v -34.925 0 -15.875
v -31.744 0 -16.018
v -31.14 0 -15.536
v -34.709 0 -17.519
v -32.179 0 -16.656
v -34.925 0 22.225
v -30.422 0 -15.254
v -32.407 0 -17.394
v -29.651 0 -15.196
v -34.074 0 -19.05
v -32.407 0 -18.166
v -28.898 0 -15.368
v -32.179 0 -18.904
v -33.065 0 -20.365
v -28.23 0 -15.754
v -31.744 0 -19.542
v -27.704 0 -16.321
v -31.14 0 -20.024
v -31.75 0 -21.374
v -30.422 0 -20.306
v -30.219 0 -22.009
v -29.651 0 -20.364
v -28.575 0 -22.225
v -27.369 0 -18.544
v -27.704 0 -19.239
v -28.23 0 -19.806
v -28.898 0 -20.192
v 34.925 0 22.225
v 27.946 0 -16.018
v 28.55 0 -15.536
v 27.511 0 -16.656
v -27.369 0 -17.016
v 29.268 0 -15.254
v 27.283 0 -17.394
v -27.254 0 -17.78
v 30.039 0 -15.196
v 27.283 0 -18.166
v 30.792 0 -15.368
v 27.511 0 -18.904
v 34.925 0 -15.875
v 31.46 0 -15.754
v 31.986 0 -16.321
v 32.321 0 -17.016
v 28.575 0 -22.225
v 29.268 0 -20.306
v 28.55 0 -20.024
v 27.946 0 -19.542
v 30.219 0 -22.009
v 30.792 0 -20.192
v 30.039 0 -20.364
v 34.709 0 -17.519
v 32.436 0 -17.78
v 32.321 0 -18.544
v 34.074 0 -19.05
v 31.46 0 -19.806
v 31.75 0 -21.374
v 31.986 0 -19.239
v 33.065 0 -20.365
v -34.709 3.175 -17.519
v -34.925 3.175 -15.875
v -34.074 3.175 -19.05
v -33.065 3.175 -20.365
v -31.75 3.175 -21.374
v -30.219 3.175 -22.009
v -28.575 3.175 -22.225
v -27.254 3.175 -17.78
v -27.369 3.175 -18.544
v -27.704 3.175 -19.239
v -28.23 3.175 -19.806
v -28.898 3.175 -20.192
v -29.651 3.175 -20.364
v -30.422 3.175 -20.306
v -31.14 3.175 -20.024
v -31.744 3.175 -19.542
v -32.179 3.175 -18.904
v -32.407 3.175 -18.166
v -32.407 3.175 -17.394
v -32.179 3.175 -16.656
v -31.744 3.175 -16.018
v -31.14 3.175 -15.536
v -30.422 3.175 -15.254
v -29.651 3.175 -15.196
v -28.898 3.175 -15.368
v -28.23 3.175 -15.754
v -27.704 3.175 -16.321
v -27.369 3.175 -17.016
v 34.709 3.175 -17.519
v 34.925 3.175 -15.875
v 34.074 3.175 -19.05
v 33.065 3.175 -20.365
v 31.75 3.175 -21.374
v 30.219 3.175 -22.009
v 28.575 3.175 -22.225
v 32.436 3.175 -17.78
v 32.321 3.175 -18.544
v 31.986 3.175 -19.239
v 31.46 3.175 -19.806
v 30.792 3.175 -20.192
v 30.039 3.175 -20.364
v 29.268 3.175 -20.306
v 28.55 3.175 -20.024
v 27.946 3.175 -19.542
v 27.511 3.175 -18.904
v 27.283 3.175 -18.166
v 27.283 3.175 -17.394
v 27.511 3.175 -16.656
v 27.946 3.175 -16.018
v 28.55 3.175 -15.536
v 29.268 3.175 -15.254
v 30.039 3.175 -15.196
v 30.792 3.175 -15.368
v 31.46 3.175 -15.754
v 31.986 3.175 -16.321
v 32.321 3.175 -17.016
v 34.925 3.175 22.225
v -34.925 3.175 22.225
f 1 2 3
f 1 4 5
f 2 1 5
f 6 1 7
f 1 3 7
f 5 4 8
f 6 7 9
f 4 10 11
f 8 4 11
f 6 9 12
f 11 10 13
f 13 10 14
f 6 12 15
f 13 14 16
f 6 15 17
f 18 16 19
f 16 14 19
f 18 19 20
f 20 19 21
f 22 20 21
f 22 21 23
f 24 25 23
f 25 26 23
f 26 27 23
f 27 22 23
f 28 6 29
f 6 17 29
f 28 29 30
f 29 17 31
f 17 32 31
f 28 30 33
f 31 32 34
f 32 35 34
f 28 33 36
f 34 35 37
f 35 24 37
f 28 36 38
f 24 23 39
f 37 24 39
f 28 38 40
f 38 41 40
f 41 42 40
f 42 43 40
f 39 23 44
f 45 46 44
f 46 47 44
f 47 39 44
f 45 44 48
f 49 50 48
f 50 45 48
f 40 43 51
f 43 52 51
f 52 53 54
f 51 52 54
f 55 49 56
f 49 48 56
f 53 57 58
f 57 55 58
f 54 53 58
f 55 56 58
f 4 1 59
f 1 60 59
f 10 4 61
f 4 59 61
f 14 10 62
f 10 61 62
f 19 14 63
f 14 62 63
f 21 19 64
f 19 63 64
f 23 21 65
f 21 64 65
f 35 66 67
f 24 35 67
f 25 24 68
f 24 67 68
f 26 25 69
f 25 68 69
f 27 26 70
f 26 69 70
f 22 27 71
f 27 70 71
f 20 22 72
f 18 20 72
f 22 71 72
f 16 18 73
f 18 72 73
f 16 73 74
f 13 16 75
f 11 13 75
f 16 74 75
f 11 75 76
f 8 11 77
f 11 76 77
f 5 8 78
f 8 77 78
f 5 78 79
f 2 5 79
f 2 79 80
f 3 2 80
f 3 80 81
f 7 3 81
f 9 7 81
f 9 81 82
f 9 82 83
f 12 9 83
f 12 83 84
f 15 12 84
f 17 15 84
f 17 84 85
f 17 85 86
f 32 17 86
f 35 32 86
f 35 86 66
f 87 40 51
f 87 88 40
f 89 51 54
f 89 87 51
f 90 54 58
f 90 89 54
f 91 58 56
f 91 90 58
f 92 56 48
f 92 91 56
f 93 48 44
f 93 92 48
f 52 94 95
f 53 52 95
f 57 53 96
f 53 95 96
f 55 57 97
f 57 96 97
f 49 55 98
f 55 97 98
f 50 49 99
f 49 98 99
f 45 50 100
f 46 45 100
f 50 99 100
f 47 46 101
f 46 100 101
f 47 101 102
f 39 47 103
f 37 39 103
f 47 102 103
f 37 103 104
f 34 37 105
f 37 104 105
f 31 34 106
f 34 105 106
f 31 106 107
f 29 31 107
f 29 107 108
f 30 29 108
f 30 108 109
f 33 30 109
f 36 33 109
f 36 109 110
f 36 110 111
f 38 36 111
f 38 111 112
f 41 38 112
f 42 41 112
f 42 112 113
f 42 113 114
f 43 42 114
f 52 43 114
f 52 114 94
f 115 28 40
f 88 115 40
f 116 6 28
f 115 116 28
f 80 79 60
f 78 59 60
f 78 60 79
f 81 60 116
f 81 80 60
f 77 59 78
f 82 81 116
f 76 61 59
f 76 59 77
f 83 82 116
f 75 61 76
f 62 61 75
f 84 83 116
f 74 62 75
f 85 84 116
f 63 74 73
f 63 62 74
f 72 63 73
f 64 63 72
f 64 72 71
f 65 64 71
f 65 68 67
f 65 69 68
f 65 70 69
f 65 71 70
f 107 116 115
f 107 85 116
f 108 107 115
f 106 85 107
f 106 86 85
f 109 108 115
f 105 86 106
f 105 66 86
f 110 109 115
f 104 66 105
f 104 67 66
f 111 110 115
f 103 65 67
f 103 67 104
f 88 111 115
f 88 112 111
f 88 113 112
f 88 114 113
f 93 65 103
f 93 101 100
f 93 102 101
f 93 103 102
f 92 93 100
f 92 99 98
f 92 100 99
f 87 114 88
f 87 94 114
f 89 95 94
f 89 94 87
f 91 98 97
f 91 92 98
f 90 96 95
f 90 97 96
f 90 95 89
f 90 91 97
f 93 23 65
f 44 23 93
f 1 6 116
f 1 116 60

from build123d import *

# Parameters (mm, degrees)
SKETCH1_W                      = 69.85
SKETCH1_H                      = 44.45
BOSS_EXTRUDE1_DEPTH            = 3.175
FILLET1_R                      = 6.35
F_6_0_204_DIAMETER_HOLE1_D     = 5.1816
F_6_0_204_DIAMETER_HOLE1_DEPTH = 38.1
F_6_0_204_DIAMETER_HOLE1_TIP   = 1.556709692


with BuildPart() as part:
    # Sketch1 → Boss-Extrude1 (new body)
    with BuildSketch(Plane(origin=(0, 0, 0), x_dir=(1, 0, 0), z_dir=(0, 1, 0))):
        Rectangle(SKETCH1_W, SKETCH1_H)
    extrude(amount=BOSS_EXTRUDE1_DEPTH)

    # Fillet1
    fillet1_edges = [part.edges().sort_by_distance(p)[0] for p in [
        (-34.925, 1.5875, -22.225),
        (34.925, 1.5875, -22.225),
    ]]
    fillet(fillet1_edges, radius=FILLET1_R)

    # #6 (0.204) Diameter Hole1
    with Locations(Plane(origin=(0, 0, 0), x_dir=(-1, 0, 0), z_dir=(0, -1, 0))):
        with Locations((-29.845, 17.78), (29.845, 17.78)):
            Hole(F_6_0_204_DIAMETER_HOLE1_D / 2, depth=F_6_0_204_DIAMETER_HOLE1_DEPTH)
            with Locations((0, 0, -(F_6_0_204_DIAMETER_HOLE1_DEPTH + F_6_0_204_DIAMETER_HOLE1_TIP / 2))):  # 118° drill point
                Cone(0, F_6_0_204_DIAMETER_HOLE1_D / 2, F_6_0_204_DIAMETER_HOLE1_TIP, mode=Mode.SUBTRACT)


solid = part.part
